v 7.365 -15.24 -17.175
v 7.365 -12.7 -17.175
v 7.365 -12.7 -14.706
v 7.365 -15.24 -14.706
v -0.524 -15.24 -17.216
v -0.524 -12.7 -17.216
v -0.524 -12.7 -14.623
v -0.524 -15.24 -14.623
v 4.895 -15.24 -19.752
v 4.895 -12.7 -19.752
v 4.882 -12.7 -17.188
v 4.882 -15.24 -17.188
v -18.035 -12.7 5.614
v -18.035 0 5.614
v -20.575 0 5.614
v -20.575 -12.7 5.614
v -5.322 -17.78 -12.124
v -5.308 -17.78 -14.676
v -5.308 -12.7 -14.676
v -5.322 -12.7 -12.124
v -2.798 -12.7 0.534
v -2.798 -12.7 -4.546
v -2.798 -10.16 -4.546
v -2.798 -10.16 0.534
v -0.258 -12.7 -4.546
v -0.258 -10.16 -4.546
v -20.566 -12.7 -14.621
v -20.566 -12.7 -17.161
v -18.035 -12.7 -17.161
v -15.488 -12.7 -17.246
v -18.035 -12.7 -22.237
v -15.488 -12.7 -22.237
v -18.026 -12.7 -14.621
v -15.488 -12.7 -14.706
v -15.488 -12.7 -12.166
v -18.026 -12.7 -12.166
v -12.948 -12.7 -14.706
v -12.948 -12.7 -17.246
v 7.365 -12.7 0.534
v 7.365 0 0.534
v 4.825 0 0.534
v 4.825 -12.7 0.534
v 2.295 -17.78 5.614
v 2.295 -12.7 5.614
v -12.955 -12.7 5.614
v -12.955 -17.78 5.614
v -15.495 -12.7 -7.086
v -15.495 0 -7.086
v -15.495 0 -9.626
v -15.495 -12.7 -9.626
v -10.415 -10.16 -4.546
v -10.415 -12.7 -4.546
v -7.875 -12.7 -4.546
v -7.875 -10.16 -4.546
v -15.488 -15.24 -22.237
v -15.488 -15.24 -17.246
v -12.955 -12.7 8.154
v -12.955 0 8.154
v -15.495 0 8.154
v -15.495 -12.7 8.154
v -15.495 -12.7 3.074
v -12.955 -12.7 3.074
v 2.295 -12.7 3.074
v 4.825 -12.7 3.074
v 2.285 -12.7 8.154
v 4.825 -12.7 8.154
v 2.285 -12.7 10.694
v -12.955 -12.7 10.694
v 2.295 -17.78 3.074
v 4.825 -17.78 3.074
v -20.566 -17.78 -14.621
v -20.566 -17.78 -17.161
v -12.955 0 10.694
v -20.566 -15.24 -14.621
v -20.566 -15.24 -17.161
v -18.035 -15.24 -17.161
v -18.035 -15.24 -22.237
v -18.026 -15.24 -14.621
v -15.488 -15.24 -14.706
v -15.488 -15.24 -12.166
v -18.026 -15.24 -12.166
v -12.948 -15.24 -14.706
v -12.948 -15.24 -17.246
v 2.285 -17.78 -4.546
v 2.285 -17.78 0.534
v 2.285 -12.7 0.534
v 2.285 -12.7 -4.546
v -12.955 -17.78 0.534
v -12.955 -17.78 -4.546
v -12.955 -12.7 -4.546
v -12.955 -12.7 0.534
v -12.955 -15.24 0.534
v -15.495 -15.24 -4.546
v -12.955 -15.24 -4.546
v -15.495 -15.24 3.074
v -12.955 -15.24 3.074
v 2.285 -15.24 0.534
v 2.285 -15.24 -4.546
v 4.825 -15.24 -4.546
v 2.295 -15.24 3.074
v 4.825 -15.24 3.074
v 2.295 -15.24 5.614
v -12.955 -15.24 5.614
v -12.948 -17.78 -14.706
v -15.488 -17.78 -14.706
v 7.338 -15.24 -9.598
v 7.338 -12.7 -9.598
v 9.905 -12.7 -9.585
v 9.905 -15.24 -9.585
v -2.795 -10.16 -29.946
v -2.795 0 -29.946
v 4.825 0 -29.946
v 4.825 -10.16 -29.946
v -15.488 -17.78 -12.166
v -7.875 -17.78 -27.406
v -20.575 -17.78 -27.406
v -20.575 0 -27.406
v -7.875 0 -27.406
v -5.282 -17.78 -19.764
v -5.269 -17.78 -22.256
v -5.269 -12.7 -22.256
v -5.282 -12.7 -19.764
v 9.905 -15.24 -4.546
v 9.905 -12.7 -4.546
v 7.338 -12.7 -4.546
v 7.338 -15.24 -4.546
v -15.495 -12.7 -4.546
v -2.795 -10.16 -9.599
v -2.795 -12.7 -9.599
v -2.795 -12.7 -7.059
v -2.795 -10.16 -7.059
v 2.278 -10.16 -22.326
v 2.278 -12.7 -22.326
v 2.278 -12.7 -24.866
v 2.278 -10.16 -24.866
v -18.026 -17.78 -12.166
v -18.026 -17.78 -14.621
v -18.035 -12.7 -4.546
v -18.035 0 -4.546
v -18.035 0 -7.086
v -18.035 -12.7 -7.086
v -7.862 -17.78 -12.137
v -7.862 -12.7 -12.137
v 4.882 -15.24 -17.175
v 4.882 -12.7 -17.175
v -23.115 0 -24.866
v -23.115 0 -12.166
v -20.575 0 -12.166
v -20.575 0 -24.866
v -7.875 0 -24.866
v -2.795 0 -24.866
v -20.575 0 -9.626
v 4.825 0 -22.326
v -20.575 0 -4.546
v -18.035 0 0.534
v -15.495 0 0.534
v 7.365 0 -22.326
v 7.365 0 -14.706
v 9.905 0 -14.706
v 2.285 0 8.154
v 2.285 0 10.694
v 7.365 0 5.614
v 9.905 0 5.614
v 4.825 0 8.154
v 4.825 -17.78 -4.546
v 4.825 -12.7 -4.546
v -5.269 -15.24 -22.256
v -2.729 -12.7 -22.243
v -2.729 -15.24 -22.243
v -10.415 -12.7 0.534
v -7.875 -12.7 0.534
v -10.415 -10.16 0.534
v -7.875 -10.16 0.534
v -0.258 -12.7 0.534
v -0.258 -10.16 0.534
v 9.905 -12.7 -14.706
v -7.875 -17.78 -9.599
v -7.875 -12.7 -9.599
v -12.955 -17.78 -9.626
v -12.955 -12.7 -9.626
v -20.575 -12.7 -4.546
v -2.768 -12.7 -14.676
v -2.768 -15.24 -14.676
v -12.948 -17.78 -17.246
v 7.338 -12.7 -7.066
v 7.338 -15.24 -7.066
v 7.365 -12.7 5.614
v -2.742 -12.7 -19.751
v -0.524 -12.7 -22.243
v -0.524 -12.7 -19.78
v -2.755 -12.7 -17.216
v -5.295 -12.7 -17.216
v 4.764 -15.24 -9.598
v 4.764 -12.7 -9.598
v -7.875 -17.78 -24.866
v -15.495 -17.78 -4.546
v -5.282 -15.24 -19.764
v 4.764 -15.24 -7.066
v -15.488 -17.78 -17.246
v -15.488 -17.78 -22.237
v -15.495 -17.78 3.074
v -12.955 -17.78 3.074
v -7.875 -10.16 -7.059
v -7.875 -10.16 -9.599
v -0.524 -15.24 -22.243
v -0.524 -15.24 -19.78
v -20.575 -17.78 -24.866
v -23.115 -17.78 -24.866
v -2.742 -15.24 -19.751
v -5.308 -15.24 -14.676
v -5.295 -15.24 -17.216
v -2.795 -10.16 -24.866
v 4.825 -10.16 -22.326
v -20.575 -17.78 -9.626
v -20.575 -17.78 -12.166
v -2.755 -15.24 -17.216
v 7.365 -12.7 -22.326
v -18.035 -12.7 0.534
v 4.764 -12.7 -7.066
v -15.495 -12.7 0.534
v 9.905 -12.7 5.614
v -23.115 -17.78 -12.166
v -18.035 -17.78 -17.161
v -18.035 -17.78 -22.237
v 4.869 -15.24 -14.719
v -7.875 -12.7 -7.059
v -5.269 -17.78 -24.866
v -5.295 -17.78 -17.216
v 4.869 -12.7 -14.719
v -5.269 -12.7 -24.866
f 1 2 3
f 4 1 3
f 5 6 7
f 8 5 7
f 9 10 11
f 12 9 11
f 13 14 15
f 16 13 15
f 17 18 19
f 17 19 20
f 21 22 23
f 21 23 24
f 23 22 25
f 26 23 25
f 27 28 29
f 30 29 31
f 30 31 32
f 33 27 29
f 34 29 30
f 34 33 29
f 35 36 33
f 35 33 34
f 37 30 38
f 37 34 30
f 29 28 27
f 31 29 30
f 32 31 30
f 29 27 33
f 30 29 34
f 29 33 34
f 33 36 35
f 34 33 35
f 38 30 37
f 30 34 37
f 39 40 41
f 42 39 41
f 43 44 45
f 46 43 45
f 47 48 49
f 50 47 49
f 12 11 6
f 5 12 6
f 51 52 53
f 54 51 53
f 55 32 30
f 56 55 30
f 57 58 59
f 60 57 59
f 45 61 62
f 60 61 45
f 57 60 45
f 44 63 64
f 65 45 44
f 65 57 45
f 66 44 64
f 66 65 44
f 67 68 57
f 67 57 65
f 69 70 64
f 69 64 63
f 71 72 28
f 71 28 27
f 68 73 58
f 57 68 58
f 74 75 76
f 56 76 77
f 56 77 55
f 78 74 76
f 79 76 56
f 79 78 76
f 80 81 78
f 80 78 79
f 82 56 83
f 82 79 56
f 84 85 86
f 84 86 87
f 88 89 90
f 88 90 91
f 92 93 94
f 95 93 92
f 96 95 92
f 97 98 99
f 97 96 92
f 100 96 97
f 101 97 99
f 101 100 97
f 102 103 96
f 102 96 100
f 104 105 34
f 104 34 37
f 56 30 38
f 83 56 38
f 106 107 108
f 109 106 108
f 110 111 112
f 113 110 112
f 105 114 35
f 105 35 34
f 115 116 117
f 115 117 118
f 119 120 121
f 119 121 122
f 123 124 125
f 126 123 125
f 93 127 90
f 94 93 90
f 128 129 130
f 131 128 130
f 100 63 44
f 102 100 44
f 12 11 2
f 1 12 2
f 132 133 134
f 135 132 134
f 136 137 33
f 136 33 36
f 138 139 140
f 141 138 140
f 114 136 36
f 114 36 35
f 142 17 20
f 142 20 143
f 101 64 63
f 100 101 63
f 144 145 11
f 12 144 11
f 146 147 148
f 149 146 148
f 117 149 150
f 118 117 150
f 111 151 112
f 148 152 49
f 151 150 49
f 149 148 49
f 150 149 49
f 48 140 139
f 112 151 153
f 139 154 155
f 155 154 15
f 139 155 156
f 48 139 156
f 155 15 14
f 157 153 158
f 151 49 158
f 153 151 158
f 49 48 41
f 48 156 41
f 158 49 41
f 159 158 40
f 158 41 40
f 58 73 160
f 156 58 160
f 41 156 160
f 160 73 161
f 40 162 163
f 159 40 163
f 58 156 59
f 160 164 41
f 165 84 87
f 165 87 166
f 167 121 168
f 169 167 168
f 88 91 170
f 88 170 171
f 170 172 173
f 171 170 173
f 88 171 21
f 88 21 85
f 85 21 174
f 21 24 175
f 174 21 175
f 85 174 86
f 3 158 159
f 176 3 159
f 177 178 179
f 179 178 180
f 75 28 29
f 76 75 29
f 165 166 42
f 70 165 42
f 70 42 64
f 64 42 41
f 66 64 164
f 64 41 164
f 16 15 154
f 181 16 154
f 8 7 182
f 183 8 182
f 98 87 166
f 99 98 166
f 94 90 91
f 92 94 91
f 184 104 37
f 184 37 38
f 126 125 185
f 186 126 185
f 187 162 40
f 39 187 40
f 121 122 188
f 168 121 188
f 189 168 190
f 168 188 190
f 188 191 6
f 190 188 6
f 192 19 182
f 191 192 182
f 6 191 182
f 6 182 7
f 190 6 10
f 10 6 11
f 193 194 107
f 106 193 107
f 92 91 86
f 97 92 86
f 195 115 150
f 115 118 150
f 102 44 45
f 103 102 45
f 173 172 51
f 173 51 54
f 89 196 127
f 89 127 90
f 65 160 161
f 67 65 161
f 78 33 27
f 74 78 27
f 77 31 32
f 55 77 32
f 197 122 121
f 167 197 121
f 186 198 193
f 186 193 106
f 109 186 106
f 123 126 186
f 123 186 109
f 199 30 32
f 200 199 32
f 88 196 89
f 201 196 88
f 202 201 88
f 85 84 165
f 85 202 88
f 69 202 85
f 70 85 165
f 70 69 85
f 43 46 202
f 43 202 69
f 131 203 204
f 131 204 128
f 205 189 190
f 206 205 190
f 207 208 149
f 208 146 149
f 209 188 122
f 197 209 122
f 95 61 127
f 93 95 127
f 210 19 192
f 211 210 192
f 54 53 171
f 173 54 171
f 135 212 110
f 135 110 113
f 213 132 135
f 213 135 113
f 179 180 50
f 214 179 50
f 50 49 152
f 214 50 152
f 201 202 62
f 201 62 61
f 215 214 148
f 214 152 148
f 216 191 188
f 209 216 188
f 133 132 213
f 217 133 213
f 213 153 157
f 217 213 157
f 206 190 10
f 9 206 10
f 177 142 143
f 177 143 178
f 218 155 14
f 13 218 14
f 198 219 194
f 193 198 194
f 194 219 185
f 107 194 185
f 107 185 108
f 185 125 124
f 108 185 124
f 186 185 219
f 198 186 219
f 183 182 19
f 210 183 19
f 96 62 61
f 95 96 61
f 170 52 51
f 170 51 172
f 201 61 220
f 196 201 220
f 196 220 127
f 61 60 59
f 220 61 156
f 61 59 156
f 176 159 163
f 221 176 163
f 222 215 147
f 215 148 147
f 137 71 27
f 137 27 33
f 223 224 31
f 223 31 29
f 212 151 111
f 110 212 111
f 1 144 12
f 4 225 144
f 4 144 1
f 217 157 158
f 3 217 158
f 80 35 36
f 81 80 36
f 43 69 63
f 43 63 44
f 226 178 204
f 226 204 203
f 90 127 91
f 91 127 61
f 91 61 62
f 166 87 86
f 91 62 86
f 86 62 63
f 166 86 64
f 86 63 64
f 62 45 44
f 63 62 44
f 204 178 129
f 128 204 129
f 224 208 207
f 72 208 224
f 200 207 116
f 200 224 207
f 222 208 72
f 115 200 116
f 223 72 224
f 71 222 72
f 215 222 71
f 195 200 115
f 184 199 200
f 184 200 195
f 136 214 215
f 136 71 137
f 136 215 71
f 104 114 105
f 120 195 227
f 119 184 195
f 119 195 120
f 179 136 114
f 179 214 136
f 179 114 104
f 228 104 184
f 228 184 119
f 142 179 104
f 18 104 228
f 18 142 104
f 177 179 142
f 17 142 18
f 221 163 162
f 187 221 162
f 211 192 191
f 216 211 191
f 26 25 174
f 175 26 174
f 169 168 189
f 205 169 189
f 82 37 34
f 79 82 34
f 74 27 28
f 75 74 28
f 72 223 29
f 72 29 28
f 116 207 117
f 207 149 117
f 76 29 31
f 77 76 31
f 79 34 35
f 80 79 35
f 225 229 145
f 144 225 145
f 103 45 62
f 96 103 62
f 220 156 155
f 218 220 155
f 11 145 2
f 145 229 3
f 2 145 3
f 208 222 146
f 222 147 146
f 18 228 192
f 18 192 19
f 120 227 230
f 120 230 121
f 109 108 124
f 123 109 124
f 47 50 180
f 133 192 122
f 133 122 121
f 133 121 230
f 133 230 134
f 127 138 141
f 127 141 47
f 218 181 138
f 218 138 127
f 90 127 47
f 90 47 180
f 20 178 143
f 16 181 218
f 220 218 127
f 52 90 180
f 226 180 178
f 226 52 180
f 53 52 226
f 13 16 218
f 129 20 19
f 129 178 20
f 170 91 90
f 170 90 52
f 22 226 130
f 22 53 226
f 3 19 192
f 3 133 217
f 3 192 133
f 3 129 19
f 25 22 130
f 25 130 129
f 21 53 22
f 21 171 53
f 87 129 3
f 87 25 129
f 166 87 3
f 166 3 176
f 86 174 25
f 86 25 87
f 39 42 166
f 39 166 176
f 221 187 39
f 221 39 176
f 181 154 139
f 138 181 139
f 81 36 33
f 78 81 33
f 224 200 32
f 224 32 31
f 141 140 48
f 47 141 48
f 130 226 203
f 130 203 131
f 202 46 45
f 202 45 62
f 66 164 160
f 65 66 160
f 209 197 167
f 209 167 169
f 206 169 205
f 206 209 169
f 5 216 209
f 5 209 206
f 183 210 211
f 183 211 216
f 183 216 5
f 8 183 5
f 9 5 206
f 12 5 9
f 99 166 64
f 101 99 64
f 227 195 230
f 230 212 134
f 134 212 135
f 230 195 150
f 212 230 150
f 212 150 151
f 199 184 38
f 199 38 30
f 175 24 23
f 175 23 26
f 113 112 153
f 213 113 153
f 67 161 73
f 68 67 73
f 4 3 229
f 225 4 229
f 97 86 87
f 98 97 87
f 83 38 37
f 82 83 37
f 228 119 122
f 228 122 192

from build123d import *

# Parameters (mm, degrees)
F1_DEPTH = 12.7
F3_DEPTH = 5.08
F4_DEPTH = 2.54
F2_W     = 2.54
F2_H     = 5.08
F2_W_2   = 5.08
F2_H_2   = 2.54
F5_DEPTH = 2.54


# Not quite as in the source:
# - a feature names something its author has since deleted; it is built from what else it names


with BuildPart() as f1:
    # F0 (on Front) → F1 (new body)
    with BuildSketch(Plane.XZ):
        Polygon((2.285067299, 10.6943689859), (-12.954932701, 10.6943689859), (-12.954932701, 8.1543689859), (-15.494932701, 8.1543689859), (-15.494932701, 0.5343689859), (-18.034932701, 0.5343689859), (-18.034932701, 5.6143689859), (-20.574932701, 5.6143689859), (-20.574932701, -4.5456310141), (-18.034932701, -4.5456310141), (-18.034932701, -7.0856310141), (-15.494932701, -7.0856310141), (-15.494932701, -9.6256310141), (-20.574932701, -9.6256310141), (-20.574932701, -12.1656310141), (-23.114932701, -12.1656310141), (-23.114932701, -24.8656310141), (-20.574932701, -24.8656310141), (-20.574932701, -27.4056310141), (-7.874932701, -27.4056310141), (-7.874932701, -24.8656310141), (-2.794932701, -24.8656310141), (-2.794932701, -29.9456310141), (4.825067299, -29.9456310141), (4.825067299, -22.3256310141), (7.365067299, -22.3256310141), (7.365067299, -14.7056310141), (9.905067299, -14.7063690238), (9.905067299, 5.6136309762), (7.365067299, 5.6136309762), (7.365067299, 0.5343689859), (4.825067299, 0.5343689859), (4.825067299, 8.1543689859), (2.285067299, 8.1543689859), align=None)
    extrude(amount=F1_DEPTH)

    # F2 (on face) → F3 (join)
    with BuildSketch(Plane.XZ.offset(12.7)):
        Polygon((-12.954932701, -9.6256310141), (-15.494932701, -9.6256310141), (-20.574932701, -9.6256310141), (-20.574932701, -12.1656310141), (-23.114932701, -12.1656310141), (-23.114932701, -24.8656310141), (-20.574932701, -24.8656310141), (-20.574932701, -27.4056310141), (-7.874932701, -27.4056310141), (-7.874932701, -24.8656310141), (-5.2690269849, -24.8656310141), (-5.2690269849, -22.2557587346), (-5.2819938649, -19.7642921814), (-5.2952575954, -17.2157885193), (-5.3084768894, -14.6758229191), (-5.3217577861, -12.124020931), (-7.8617233863, -12.1372402251), (-7.874932701, -9.599192068), align=None)
        Polygon((-18.0264338851, -14.6206484801), (-18.0264338851, -12.1656310141), (-15.4883228242, -12.1656310141), (-15.4883228242, -14.7056310141), (-12.9483228242, -14.7056310141), (-12.9483228242, -17.2456310141), (-15.4883228242, -17.2456310141), (-15.4883228242, -22.2368724644), (-18.034932701, -22.2368724644), (-18.034932701, -17.1606484801), (-20.5664338851, -17.1606484801), (-20.5664338851, -14.6206484801), align=None, mode=Mode.SUBTRACT)
        Polygon((-12.954932701, 3.0743689859), (-15.494932701, 3.0743689859), (-15.494932701, 0.5343689859), (-15.494932701, -4.5456310141), (-12.954932701, -4.5456310141), (-12.954932701, 0.5343689859), (-10.414932701, 0.5343689859), (-7.874932701, 0.5343689859), (-2.7977656573, 0.5343689859), (-0.2577656573, 0.5343689859), (2.285067299, 0.5343689859), (2.285067299, -4.5456310141), (4.825067299, -4.5456310141), (4.825067299, 0.5343689859), (4.825067299, 3.0743689859), (2.2954009473, 3.0743689859), (2.2954009473, 5.6143689859), (-12.954932701, 5.6143689859), align=None)
    extrude(amount=F3_DEPTH)

    # F2 (on face) → F5 (cut)
    with BuildSketch(Plane.XZ.offset(12.7)):
        with Locations((-9.144932701, -2.0056310141)):
            Rectangle(F2_W, F2_H)
        with Locations((-1.5277656573, -2.0056310141)):
            Rectangle(F2_W, F2_H)
        with Locations((-5.334932701, -8.329192068)):
            Rectangle(F2_W_2, F2_H_2)
        Polygon((4.825067299, -24.8656310141), (4.825067299, -22.3256310141), (2.2784571629, -22.3256310141), (2.2784571629, -24.8656310141), (-2.794932701, -24.8656310141), (-2.794932701, -29.9456310141), (4.825067299, -29.9456310141), align=None)
    extrude(amount=-F5_DEPTH, mode=Mode.SUBTRACT)


with BuildPart() as f4:
    # F2 (on face) → F4 (new body)
    with BuildSketch(Plane.XZ.offset(12.7)):
        Polygon((-12.954932701, 3.0743689859), (-15.494932701, 3.0743689859), (-15.494932701, 0.5343689859), (-15.494932701, -4.5456310141), (-12.954932701, -4.5456310141), (-12.954932701, 0.5343689859), (-10.414932701, 0.5343689859), (-7.874932701, 0.5343689859), (-2.7977656573, 0.5343689859), (-0.2577656573, 0.5343689859), (2.285067299, 0.5343689859), (2.285067299, -4.5456310141), (4.825067299, -4.5456310141), (4.825067299, 0.5343689859), (4.825067299, 3.0743689859), (2.2954009473, 3.0743689859), (2.2954009473, 5.6143689859), (-12.954932701, 5.6143689859), align=None)
    extrude(amount=F4_DEPTH)


with BuildPart() as f4b:
    # F2 (on face) → F4, piece 2 (new body)
    with BuildSketch(Plane.XZ.offset(12.7)):
        Polygon((-15.4883228242, -12.1656310141), (-18.0264338851, -12.1656310141), (-18.0264338851, -14.6206484801), (-20.5664338851, -14.6206484801), (-20.5664338851, -17.1606484801), (-18.034932701, -17.1606484801), (-18.034932701, -22.2368724644), (-15.4883228242, -22.2368724644), (-15.4883228242, -17.2456310141), (-12.9483228242, -17.2456310141), (-12.9483228242, -14.7056310141), (-15.4883228242, -14.7056310141), align=None)
    extrude(amount=F4_DEPTH)


with BuildPart() as f4c:
    # F2 (on face) → F4, piece 3 (new body)
    with BuildSketch(Plane.XZ.offset(12.7)):
        Polygon((9.905067299, -9.585092935), (9.905067299, -4.5463690238), (7.3384868927, -4.5463690238), (7.3384868927, -7.0657309794), (4.7636916861, -7.0657309794), (4.7636916861, -9.5984507462), (7.3384868927, -9.5984507462), align=None)
    extrude(amount=F4_DEPTH)


with BuildPart() as f4d:
    # F2 (on face) → F4, piece 4 (new body)
    with BuildSketch(Plane.XZ.offset(12.7)):
        Polygon((7.365067299, -17.1747295235), (7.365067299, -14.7056310141), (4.8688458945, -14.7186226407), (4.8816287444, -17.1747295235), (4.8816960115, -17.1876542714), align=None)
    extrude(amount=F4_DEPTH)


with BuildPart() as f4e:
    # F2 (on face) → F4, piece 5 (new body)
    with BuildSketch(Plane.XZ.offset(12.7)):
        Polygon((-2.7684768894, -14.6758229191), (-5.3084768894, -14.6758229191), (-5.2952575954, -17.2157885193), (-2.7552575954, -17.2157885193), (-2.742062664, -19.7510730664), (-5.2819938649, -19.7642921814), (-5.2690269849, -22.2557587346), (-2.7288519475, -22.2425383505), (-0.5240406026, -22.2425383505), (-0.5240406026, -19.7799838678), (4.8950410482, -19.7517801655), (4.8816960115, -17.1876542714), (-0.5240406026, -17.2157885193), (-0.5240406026, -14.6225383505), align=None)
    extrude(amount=F4_DEPTH)


solid = Compound([f1.part, f4.part, f4b.part, f4c.part, f4d.part, f4e.part])
